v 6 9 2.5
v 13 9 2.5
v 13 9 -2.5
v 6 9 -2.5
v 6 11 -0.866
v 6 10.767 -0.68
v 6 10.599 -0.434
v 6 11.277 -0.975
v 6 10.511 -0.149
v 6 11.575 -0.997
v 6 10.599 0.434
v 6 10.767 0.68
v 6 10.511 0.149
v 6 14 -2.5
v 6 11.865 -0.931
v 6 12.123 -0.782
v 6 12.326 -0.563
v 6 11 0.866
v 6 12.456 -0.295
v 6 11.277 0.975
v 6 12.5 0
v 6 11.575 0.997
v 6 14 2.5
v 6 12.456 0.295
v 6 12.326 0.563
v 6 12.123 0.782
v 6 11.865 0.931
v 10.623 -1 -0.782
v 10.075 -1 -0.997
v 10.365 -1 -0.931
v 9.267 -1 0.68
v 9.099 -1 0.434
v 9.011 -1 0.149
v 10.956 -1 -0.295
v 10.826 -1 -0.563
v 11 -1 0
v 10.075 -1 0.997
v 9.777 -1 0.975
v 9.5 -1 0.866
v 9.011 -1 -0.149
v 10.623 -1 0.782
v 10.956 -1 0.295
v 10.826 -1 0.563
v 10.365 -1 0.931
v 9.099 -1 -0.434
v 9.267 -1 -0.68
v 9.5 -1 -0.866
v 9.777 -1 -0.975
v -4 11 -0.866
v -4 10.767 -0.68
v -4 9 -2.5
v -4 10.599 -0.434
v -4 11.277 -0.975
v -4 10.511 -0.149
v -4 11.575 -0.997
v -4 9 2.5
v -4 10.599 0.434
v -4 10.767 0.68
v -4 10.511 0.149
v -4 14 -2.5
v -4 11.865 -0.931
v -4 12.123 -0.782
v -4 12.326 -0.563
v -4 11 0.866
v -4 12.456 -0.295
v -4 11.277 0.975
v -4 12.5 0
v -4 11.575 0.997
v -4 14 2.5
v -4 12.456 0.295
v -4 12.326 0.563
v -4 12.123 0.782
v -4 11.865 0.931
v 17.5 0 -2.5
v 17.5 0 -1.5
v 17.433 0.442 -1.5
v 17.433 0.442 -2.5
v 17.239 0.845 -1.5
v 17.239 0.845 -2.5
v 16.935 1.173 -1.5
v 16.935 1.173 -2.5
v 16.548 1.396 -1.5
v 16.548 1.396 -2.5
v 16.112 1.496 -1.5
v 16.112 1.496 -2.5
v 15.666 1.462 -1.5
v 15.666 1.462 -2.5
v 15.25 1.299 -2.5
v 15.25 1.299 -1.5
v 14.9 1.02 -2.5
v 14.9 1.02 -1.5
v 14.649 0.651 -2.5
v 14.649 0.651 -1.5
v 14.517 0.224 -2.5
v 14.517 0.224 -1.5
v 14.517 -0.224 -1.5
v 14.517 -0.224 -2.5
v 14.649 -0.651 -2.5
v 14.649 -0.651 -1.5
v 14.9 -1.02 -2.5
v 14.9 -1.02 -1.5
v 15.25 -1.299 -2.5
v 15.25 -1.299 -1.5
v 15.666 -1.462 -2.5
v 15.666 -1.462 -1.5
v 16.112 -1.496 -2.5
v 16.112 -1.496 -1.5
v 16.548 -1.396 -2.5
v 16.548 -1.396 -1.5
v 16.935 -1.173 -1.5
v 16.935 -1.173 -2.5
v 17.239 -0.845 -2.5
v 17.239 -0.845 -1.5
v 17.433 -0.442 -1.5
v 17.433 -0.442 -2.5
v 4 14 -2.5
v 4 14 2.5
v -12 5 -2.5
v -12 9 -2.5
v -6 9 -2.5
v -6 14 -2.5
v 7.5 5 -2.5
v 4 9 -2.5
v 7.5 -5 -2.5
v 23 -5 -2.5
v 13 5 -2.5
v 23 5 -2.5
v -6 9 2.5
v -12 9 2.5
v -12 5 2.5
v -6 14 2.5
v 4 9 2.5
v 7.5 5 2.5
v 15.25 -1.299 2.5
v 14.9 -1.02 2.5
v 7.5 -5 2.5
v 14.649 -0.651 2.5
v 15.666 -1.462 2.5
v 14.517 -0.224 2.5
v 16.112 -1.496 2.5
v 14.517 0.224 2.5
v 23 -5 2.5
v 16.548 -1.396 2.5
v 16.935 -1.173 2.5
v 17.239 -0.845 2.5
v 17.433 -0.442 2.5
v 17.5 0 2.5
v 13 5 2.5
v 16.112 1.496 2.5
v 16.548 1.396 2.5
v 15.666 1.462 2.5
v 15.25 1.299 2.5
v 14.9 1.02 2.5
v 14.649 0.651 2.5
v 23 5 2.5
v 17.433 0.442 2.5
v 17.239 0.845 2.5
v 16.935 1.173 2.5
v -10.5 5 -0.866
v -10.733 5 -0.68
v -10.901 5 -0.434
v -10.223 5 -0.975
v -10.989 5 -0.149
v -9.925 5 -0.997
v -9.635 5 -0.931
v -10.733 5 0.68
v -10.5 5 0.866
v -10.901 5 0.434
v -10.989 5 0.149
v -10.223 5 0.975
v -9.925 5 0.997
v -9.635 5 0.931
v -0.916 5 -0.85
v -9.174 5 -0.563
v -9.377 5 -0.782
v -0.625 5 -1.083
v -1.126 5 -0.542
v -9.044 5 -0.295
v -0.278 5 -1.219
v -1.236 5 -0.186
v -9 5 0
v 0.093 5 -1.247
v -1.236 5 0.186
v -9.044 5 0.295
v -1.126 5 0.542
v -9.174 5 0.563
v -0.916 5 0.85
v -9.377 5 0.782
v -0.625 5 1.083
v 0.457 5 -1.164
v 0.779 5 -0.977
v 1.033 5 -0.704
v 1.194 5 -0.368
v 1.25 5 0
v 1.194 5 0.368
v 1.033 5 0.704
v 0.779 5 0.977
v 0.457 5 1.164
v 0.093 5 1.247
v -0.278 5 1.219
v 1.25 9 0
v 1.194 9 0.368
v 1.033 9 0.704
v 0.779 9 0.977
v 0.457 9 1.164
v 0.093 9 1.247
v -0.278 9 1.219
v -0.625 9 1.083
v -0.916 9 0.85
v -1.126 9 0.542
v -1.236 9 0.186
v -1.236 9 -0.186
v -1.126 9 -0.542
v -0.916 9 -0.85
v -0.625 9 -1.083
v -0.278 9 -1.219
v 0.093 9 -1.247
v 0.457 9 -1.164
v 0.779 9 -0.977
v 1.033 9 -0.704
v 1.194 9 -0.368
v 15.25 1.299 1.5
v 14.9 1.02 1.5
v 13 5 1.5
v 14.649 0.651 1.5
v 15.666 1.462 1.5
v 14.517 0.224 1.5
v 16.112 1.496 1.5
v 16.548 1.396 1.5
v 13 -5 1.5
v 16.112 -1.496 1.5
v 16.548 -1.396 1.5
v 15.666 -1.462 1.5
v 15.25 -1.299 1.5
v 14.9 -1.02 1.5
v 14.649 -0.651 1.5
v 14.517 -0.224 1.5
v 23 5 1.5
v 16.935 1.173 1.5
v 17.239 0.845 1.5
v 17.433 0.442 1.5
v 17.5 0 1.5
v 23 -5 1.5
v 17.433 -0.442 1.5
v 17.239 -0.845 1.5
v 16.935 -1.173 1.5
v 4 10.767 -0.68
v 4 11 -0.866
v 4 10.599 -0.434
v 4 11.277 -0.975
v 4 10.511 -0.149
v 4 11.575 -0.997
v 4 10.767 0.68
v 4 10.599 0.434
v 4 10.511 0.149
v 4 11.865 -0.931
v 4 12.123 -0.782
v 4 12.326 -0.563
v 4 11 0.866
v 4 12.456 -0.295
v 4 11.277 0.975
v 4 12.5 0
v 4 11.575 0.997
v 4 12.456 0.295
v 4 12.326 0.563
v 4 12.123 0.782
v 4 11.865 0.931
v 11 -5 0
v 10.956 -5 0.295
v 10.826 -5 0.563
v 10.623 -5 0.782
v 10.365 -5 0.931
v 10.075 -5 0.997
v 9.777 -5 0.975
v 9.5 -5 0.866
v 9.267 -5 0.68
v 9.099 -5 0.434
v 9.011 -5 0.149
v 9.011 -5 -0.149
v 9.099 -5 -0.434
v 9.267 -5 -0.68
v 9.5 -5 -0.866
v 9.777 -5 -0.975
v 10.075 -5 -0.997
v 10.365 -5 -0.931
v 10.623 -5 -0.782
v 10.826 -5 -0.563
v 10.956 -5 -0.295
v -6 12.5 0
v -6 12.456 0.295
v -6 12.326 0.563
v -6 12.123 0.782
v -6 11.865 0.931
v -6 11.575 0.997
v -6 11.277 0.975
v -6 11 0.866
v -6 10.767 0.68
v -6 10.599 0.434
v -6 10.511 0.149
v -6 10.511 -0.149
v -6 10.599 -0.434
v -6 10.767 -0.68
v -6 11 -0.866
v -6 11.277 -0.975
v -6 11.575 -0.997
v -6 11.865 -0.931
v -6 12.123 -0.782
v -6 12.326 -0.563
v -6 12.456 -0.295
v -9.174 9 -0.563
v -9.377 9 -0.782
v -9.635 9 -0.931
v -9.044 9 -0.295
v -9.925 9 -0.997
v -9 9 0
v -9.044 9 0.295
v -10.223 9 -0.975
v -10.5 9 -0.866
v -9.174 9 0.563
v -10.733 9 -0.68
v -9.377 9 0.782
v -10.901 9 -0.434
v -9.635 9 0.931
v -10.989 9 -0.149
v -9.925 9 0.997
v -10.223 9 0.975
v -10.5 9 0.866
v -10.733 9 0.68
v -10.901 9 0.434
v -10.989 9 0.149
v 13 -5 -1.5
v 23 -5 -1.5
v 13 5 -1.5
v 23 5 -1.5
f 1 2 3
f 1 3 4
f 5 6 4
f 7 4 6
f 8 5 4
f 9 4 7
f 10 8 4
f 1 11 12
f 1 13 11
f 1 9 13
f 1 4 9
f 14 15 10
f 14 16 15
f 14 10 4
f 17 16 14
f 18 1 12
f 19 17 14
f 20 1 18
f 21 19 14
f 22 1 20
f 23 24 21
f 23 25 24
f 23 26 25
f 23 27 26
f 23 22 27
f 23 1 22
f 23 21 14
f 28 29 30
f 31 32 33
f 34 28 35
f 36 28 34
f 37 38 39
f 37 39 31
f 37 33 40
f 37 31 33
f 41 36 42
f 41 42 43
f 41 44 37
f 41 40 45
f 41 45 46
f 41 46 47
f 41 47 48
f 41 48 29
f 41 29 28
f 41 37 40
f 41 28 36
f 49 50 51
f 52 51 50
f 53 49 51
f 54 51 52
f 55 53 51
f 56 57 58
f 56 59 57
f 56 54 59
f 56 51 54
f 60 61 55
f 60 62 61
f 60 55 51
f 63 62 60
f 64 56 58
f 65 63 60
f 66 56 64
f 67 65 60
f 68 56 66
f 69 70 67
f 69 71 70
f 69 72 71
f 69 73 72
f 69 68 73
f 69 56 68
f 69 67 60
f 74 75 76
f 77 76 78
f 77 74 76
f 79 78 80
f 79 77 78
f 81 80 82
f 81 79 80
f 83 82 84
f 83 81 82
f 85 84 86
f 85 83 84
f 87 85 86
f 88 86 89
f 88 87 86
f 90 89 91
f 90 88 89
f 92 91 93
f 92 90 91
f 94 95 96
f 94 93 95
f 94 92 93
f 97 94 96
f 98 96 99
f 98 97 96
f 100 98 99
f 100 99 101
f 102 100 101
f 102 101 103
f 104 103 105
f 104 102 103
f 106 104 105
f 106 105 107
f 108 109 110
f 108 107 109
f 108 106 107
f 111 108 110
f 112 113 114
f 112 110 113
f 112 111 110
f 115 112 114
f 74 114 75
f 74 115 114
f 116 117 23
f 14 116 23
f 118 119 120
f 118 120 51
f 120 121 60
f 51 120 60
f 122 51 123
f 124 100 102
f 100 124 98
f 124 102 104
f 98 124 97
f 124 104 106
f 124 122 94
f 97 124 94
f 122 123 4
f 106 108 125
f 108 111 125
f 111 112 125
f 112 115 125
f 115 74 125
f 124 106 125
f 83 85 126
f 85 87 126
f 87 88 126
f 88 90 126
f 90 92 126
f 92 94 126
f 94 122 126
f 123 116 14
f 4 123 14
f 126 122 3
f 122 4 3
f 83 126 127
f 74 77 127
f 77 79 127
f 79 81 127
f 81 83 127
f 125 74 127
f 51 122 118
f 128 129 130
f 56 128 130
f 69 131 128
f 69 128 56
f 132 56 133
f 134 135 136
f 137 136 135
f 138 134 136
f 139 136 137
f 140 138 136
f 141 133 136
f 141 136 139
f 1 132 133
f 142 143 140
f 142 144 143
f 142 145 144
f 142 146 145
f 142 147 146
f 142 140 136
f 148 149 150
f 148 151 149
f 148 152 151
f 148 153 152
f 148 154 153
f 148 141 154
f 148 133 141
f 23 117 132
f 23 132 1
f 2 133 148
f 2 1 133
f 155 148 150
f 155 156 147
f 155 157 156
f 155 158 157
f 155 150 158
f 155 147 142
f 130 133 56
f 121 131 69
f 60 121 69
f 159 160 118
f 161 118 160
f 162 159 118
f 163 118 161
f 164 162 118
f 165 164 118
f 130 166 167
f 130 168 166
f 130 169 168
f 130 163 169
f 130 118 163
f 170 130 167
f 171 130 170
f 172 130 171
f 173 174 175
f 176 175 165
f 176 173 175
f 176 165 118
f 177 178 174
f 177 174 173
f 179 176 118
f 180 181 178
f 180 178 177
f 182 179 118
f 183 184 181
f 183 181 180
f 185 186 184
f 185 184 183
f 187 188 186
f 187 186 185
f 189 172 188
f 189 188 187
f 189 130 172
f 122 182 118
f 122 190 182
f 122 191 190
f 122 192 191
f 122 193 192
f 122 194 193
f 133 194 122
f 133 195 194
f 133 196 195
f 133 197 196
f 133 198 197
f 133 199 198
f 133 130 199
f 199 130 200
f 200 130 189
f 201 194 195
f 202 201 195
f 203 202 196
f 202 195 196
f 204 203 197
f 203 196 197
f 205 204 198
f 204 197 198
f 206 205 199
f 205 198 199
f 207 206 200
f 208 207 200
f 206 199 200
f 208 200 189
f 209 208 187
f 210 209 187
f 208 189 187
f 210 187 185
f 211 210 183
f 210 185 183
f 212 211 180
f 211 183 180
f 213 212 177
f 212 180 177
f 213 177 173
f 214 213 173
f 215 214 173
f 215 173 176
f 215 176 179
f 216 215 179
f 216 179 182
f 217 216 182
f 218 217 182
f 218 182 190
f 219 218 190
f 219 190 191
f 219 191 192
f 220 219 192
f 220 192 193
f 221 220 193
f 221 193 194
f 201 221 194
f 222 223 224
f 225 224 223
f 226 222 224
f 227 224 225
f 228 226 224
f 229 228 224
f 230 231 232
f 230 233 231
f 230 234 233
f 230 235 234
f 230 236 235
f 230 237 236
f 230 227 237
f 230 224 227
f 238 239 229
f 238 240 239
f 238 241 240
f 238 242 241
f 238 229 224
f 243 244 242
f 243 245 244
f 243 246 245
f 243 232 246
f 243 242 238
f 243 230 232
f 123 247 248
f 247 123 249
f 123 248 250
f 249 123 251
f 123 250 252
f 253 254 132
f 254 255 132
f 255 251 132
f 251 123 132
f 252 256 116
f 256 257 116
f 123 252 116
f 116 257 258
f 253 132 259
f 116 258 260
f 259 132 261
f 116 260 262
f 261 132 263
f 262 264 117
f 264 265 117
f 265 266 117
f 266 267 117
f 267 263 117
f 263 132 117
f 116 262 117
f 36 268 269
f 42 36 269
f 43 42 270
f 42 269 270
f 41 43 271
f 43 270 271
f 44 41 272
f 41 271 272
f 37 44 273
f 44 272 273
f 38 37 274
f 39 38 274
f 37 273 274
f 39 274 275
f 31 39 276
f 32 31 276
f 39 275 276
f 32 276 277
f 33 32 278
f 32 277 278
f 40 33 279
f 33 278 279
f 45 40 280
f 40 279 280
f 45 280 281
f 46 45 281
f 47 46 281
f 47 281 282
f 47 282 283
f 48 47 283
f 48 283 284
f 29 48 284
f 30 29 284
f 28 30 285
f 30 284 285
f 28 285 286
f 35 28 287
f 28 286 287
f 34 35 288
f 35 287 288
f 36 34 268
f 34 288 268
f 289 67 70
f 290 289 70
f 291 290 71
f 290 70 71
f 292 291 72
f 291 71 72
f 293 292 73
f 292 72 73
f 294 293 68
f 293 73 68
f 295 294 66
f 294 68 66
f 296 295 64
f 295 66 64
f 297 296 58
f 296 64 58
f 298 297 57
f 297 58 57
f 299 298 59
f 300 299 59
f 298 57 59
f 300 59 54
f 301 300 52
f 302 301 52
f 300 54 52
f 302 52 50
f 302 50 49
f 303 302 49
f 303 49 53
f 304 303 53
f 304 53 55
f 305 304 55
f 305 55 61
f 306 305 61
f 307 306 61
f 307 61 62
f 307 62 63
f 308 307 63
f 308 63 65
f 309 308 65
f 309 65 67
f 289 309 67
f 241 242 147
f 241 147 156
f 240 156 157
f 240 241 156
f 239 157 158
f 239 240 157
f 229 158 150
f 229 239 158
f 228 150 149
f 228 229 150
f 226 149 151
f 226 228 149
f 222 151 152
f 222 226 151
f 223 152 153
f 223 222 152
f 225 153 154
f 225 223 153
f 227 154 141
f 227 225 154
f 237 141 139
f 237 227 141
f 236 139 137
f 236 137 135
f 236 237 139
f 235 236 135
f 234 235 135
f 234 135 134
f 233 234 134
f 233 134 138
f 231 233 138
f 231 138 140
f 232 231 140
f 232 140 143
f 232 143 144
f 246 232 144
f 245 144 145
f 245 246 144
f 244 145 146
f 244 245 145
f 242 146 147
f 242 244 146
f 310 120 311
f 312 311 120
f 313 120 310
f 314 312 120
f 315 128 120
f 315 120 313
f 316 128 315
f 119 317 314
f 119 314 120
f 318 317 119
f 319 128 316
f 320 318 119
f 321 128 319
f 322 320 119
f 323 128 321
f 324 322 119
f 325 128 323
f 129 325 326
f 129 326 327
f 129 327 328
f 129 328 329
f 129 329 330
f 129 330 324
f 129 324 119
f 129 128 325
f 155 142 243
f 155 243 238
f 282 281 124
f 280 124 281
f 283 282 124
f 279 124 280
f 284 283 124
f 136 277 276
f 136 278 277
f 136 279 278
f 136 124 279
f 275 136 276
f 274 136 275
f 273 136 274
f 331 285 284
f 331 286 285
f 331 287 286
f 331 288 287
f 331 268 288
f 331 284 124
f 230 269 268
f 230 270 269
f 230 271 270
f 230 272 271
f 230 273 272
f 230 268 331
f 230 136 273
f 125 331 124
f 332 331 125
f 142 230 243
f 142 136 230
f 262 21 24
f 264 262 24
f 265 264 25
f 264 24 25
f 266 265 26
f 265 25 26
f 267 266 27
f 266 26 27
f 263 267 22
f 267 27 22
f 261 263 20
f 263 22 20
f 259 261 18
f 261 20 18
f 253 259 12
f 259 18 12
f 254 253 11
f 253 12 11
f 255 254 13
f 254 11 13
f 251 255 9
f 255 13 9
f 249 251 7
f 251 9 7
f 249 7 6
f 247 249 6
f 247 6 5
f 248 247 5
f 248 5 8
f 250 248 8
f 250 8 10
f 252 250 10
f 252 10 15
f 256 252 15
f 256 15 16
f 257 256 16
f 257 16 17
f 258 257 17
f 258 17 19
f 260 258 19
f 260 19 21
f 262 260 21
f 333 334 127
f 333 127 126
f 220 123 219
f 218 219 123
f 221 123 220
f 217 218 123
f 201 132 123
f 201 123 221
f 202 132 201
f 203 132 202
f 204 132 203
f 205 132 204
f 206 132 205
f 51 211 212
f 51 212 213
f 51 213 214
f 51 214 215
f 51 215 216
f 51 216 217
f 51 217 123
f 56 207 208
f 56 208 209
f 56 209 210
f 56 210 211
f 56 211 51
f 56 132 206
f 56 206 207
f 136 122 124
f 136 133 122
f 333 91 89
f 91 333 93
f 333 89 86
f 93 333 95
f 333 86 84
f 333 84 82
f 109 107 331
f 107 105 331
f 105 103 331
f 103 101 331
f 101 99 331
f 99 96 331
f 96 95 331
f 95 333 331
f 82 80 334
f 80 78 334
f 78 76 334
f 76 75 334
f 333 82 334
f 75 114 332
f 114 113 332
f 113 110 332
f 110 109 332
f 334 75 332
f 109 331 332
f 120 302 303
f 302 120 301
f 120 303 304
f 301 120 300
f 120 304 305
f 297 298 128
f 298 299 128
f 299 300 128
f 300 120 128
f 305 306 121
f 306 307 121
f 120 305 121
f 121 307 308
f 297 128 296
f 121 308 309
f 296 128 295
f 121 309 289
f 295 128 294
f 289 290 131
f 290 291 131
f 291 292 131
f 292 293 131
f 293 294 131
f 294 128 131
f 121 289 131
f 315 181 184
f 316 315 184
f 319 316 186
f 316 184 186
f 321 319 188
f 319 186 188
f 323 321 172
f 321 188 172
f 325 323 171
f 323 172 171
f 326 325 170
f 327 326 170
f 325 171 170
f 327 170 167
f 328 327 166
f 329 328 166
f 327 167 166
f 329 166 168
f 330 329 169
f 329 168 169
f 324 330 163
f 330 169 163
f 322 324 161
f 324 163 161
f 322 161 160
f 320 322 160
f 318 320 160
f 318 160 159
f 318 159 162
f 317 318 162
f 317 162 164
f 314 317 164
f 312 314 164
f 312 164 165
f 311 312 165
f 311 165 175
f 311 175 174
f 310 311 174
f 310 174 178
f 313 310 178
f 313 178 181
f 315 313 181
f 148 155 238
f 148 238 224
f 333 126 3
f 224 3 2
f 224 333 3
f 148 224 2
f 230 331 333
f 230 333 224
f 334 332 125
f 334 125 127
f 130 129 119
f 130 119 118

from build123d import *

# Parameters (mm, degrees)
F0_R     = 1.5
F0_W     = 2
F0_H     = 5
F1_DEPTH = 2.5
F2_R     = 1.25
F2_R_2   = 1
F3_DEPTH = 9.001
F4_W     = 10
F4_H     = 3
F5_DEPTH = 19.001
F6_R     = 1
F7_DEPTH = 4
F8_R     = 1
F9_DEPTH = 18.001


with BuildPart() as f1:
    # F0 (on Top) → F1 (new body, symmetric)
    with BuildSketch(Plane.XY):
        Polygon((23, -5), (23, 5), (13, 5), (13, 9), (6, 9), (4, 9), (-4, 9), (-6, 9), (-12, 9), (-12, 5), (7.5, 5), (7.5, -5), align=None)
        with Locations((16, 0)):
            Circle(F0_R, mode=Mode.SUBTRACT)
        with Locations((5, 11.5)):
            Rectangle(F0_W, F0_H)
        with Locations((-5, 11.5)):
            Rectangle(F0_W, F0_H)
    extrude(amount=F1_DEPTH, both=True)

    # F2 (on face) → F3 (cut, through all)
    with BuildSketch(Plane.XZ.offset(-5)):
        Circle(F2_R)
        with Locations((-10, 0)):
            Circle(F2_R_2)
    extrude(amount=-F3_DEPTH, mode=Mode.SUBTRACT)

    # F4 (on face) → F5 (cut, through all)
    with BuildSketch(Plane.XZ.offset(5)):
        with Locations((18, 0)):
            Rectangle(F4_W, F4_H)
    extrude(amount=-F5_DEPTH, mode=Mode.SUBTRACT)

    # F6 (on face) → F7 (cut)
    with BuildSketch(Plane.XZ.offset(5)):
        with Locations((10, 0)):
            Circle(F6_R)
    extrude(amount=-F7_DEPTH, mode=Mode.SUBTRACT)

    # F8 (on face) → F9 (cut, through all)
    with BuildSketch(Plane.YZ.offset(6)):
        with Locations((11.5, 0)):
            Circle(F8_R)
    extrude(amount=-F9_DEPTH, mode=Mode.SUBTRACT)


solid = f1.part
